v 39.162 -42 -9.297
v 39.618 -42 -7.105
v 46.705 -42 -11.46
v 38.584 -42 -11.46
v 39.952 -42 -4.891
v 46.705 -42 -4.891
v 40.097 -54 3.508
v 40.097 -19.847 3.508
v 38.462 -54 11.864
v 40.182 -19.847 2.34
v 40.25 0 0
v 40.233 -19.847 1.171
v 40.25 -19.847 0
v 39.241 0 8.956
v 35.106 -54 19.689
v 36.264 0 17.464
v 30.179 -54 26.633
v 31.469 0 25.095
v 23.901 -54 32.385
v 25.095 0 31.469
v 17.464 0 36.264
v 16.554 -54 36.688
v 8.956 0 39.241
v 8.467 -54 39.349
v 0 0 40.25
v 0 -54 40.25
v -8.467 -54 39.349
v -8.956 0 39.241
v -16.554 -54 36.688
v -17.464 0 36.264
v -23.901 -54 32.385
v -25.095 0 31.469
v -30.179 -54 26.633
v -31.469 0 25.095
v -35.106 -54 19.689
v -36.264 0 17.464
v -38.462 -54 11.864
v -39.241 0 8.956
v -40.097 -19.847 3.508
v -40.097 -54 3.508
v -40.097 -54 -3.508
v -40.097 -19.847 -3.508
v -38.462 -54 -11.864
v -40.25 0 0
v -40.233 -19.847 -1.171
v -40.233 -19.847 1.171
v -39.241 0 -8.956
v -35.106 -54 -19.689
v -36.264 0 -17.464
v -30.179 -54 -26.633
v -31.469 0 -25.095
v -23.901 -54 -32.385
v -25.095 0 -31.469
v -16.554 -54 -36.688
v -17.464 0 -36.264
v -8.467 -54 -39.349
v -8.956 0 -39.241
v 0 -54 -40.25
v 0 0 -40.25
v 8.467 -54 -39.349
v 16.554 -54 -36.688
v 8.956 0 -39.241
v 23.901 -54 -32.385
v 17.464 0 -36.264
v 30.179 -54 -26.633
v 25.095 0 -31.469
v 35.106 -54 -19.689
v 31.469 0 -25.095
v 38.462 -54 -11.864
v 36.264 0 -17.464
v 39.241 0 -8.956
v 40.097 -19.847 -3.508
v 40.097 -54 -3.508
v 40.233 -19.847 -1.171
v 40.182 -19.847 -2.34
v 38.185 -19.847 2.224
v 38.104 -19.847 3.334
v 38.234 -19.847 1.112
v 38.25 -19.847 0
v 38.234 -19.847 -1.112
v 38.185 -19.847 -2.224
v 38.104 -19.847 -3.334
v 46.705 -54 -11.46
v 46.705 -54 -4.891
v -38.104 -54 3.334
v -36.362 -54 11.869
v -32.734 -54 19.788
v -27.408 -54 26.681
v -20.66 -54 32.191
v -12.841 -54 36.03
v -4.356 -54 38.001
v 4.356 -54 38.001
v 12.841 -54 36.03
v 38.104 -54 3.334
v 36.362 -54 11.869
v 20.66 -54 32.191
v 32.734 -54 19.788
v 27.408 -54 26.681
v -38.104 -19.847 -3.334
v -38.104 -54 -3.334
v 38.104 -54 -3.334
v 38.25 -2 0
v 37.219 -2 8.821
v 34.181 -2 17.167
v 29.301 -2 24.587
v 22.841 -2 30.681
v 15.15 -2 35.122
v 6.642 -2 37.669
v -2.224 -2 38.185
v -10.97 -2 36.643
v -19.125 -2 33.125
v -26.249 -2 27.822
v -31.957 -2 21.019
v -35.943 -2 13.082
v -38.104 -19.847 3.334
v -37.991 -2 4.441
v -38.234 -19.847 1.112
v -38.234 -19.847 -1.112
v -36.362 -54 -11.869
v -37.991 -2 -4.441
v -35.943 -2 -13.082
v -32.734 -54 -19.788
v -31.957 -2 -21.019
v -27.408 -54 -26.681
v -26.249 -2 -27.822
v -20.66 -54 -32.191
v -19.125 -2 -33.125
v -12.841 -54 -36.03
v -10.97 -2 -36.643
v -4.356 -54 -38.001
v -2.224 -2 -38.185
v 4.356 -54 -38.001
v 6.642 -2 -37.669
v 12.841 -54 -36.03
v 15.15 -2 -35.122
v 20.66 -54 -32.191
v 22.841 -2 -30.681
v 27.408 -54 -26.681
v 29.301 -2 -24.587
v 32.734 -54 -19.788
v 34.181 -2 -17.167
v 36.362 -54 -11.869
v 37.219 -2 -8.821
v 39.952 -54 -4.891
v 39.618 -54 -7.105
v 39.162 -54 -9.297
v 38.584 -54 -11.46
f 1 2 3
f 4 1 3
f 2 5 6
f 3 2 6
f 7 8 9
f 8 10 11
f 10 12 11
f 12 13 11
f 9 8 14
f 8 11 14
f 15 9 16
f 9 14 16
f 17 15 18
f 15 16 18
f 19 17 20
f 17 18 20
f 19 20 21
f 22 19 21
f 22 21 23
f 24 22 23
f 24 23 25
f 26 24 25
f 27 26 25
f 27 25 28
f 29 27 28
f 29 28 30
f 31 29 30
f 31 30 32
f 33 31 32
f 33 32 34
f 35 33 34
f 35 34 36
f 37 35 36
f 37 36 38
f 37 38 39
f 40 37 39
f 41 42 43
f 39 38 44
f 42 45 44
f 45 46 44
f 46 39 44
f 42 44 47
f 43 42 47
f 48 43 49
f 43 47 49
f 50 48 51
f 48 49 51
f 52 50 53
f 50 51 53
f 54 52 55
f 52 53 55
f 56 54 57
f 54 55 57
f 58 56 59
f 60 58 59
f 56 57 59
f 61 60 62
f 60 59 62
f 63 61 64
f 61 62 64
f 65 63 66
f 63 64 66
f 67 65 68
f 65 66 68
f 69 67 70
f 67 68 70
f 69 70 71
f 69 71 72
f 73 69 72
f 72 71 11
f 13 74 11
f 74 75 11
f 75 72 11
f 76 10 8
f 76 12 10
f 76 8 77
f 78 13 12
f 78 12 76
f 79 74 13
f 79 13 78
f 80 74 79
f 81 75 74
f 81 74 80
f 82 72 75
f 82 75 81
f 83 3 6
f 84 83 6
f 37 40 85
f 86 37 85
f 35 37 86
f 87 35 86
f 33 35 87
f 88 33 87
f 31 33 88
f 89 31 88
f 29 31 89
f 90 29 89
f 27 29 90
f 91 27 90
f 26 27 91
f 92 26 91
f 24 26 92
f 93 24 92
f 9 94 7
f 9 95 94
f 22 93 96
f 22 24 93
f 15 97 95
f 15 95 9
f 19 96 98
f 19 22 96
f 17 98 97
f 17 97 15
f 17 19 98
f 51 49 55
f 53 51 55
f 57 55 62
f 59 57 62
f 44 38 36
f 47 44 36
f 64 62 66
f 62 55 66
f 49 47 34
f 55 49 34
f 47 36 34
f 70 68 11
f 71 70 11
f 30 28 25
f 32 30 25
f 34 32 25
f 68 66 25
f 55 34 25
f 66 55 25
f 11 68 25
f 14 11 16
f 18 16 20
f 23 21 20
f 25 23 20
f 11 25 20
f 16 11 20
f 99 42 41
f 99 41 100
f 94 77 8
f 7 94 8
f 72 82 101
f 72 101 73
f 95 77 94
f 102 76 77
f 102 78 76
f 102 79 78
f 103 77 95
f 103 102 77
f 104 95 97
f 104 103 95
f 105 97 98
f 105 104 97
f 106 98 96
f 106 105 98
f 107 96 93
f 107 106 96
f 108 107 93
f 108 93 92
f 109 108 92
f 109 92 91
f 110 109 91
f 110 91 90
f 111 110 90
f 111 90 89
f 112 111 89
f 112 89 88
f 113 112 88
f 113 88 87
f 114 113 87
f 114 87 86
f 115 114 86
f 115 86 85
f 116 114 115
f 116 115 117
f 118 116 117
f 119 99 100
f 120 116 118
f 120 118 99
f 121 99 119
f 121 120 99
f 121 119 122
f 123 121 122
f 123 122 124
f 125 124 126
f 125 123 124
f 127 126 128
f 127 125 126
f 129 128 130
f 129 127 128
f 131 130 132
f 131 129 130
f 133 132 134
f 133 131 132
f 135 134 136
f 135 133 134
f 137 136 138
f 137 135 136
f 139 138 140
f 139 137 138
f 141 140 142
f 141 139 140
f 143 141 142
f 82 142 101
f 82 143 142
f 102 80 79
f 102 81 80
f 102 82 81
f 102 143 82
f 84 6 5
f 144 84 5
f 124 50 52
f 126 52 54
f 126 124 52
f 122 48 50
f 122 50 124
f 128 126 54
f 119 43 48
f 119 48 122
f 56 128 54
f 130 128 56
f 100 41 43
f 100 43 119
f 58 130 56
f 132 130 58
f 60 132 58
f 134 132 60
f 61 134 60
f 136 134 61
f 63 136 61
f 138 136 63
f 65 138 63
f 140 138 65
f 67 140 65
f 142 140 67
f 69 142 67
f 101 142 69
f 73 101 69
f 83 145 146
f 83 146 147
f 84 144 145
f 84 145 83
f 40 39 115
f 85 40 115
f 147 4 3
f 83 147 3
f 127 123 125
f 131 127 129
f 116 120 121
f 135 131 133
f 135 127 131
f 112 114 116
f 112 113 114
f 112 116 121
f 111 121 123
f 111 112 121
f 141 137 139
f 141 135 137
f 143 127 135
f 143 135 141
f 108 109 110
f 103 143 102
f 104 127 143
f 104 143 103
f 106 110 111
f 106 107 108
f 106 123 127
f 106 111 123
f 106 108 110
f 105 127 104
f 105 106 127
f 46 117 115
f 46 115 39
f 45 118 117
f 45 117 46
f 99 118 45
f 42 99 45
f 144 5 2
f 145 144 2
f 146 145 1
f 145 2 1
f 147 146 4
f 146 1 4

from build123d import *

# Parameters (mm, degrees)
F0_R     = 40.25
F1_DEPTH = 54
F2_T     = -2
F3_W     = 6.55362
F3_H     = 35.002304
F3_W_2   = 6.255735
F4_ANGLE = 10
F6_DEPTH = 12


with BuildPart() as f1:
    # F0 (on Front) → F1 (new body)
    with BuildSketch(Plane.XZ):
        Circle(F0_R)
    extrude(amount=F1_DEPTH)

    # F2
    f2_openings = [f1.faces().sort_by_distance(p)[0] for p in [
        (0, -54, 0),
    ]]
    offset(amount=F2_T, openings=f2_openings)

    # F3 (on Top) → F4 (revolve, symmetric, cut)
    with BuildSketch(Plane.XY) as f4_sk:
        with Locations((40.951349, -37.34813)):
            Rectangle(F3_W, F3_H)
        with Locations((-40.819993, -37.34813)):
            Rectangle(F3_W_2, F3_H)
    revolve(axis=Axis((0, 0, 0), (0, -1, 0)), revolution_arc=F4_ANGLE / 2, mode=Mode.SUBTRACT)
    revolve(f4_sk.sketch, axis=Axis((0, 0, 0), (0, 1, 0)), revolution_arc=F4_ANGLE / 2, mode=Mode.SUBTRACT)


with BuildPart() as f6:
    # F5 (on Front) → F6 (new body)
    with BuildSketch(Plane.XZ):
        with BuildLine():
            Line((46.704643, -4.890726), (39.951762, -4.890726))
            ThreePointArc((39.951762, -4.890726), (39.405059, -8.20389), (38.584089, -11.459954))
            Line((38.584089, -11.459954), (46.704643, -11.459954))
            Line((46.704643, -11.459954), (46.704643, -4.890726))
        make_face()
    extrude(amount=F6_DEPTH)


with BuildPart() as f6_1:
    # F7: moved
    add(f6.part.moved(Location((0, -42, 0))))


solid = Compound([f1.part, f6_1.part])
